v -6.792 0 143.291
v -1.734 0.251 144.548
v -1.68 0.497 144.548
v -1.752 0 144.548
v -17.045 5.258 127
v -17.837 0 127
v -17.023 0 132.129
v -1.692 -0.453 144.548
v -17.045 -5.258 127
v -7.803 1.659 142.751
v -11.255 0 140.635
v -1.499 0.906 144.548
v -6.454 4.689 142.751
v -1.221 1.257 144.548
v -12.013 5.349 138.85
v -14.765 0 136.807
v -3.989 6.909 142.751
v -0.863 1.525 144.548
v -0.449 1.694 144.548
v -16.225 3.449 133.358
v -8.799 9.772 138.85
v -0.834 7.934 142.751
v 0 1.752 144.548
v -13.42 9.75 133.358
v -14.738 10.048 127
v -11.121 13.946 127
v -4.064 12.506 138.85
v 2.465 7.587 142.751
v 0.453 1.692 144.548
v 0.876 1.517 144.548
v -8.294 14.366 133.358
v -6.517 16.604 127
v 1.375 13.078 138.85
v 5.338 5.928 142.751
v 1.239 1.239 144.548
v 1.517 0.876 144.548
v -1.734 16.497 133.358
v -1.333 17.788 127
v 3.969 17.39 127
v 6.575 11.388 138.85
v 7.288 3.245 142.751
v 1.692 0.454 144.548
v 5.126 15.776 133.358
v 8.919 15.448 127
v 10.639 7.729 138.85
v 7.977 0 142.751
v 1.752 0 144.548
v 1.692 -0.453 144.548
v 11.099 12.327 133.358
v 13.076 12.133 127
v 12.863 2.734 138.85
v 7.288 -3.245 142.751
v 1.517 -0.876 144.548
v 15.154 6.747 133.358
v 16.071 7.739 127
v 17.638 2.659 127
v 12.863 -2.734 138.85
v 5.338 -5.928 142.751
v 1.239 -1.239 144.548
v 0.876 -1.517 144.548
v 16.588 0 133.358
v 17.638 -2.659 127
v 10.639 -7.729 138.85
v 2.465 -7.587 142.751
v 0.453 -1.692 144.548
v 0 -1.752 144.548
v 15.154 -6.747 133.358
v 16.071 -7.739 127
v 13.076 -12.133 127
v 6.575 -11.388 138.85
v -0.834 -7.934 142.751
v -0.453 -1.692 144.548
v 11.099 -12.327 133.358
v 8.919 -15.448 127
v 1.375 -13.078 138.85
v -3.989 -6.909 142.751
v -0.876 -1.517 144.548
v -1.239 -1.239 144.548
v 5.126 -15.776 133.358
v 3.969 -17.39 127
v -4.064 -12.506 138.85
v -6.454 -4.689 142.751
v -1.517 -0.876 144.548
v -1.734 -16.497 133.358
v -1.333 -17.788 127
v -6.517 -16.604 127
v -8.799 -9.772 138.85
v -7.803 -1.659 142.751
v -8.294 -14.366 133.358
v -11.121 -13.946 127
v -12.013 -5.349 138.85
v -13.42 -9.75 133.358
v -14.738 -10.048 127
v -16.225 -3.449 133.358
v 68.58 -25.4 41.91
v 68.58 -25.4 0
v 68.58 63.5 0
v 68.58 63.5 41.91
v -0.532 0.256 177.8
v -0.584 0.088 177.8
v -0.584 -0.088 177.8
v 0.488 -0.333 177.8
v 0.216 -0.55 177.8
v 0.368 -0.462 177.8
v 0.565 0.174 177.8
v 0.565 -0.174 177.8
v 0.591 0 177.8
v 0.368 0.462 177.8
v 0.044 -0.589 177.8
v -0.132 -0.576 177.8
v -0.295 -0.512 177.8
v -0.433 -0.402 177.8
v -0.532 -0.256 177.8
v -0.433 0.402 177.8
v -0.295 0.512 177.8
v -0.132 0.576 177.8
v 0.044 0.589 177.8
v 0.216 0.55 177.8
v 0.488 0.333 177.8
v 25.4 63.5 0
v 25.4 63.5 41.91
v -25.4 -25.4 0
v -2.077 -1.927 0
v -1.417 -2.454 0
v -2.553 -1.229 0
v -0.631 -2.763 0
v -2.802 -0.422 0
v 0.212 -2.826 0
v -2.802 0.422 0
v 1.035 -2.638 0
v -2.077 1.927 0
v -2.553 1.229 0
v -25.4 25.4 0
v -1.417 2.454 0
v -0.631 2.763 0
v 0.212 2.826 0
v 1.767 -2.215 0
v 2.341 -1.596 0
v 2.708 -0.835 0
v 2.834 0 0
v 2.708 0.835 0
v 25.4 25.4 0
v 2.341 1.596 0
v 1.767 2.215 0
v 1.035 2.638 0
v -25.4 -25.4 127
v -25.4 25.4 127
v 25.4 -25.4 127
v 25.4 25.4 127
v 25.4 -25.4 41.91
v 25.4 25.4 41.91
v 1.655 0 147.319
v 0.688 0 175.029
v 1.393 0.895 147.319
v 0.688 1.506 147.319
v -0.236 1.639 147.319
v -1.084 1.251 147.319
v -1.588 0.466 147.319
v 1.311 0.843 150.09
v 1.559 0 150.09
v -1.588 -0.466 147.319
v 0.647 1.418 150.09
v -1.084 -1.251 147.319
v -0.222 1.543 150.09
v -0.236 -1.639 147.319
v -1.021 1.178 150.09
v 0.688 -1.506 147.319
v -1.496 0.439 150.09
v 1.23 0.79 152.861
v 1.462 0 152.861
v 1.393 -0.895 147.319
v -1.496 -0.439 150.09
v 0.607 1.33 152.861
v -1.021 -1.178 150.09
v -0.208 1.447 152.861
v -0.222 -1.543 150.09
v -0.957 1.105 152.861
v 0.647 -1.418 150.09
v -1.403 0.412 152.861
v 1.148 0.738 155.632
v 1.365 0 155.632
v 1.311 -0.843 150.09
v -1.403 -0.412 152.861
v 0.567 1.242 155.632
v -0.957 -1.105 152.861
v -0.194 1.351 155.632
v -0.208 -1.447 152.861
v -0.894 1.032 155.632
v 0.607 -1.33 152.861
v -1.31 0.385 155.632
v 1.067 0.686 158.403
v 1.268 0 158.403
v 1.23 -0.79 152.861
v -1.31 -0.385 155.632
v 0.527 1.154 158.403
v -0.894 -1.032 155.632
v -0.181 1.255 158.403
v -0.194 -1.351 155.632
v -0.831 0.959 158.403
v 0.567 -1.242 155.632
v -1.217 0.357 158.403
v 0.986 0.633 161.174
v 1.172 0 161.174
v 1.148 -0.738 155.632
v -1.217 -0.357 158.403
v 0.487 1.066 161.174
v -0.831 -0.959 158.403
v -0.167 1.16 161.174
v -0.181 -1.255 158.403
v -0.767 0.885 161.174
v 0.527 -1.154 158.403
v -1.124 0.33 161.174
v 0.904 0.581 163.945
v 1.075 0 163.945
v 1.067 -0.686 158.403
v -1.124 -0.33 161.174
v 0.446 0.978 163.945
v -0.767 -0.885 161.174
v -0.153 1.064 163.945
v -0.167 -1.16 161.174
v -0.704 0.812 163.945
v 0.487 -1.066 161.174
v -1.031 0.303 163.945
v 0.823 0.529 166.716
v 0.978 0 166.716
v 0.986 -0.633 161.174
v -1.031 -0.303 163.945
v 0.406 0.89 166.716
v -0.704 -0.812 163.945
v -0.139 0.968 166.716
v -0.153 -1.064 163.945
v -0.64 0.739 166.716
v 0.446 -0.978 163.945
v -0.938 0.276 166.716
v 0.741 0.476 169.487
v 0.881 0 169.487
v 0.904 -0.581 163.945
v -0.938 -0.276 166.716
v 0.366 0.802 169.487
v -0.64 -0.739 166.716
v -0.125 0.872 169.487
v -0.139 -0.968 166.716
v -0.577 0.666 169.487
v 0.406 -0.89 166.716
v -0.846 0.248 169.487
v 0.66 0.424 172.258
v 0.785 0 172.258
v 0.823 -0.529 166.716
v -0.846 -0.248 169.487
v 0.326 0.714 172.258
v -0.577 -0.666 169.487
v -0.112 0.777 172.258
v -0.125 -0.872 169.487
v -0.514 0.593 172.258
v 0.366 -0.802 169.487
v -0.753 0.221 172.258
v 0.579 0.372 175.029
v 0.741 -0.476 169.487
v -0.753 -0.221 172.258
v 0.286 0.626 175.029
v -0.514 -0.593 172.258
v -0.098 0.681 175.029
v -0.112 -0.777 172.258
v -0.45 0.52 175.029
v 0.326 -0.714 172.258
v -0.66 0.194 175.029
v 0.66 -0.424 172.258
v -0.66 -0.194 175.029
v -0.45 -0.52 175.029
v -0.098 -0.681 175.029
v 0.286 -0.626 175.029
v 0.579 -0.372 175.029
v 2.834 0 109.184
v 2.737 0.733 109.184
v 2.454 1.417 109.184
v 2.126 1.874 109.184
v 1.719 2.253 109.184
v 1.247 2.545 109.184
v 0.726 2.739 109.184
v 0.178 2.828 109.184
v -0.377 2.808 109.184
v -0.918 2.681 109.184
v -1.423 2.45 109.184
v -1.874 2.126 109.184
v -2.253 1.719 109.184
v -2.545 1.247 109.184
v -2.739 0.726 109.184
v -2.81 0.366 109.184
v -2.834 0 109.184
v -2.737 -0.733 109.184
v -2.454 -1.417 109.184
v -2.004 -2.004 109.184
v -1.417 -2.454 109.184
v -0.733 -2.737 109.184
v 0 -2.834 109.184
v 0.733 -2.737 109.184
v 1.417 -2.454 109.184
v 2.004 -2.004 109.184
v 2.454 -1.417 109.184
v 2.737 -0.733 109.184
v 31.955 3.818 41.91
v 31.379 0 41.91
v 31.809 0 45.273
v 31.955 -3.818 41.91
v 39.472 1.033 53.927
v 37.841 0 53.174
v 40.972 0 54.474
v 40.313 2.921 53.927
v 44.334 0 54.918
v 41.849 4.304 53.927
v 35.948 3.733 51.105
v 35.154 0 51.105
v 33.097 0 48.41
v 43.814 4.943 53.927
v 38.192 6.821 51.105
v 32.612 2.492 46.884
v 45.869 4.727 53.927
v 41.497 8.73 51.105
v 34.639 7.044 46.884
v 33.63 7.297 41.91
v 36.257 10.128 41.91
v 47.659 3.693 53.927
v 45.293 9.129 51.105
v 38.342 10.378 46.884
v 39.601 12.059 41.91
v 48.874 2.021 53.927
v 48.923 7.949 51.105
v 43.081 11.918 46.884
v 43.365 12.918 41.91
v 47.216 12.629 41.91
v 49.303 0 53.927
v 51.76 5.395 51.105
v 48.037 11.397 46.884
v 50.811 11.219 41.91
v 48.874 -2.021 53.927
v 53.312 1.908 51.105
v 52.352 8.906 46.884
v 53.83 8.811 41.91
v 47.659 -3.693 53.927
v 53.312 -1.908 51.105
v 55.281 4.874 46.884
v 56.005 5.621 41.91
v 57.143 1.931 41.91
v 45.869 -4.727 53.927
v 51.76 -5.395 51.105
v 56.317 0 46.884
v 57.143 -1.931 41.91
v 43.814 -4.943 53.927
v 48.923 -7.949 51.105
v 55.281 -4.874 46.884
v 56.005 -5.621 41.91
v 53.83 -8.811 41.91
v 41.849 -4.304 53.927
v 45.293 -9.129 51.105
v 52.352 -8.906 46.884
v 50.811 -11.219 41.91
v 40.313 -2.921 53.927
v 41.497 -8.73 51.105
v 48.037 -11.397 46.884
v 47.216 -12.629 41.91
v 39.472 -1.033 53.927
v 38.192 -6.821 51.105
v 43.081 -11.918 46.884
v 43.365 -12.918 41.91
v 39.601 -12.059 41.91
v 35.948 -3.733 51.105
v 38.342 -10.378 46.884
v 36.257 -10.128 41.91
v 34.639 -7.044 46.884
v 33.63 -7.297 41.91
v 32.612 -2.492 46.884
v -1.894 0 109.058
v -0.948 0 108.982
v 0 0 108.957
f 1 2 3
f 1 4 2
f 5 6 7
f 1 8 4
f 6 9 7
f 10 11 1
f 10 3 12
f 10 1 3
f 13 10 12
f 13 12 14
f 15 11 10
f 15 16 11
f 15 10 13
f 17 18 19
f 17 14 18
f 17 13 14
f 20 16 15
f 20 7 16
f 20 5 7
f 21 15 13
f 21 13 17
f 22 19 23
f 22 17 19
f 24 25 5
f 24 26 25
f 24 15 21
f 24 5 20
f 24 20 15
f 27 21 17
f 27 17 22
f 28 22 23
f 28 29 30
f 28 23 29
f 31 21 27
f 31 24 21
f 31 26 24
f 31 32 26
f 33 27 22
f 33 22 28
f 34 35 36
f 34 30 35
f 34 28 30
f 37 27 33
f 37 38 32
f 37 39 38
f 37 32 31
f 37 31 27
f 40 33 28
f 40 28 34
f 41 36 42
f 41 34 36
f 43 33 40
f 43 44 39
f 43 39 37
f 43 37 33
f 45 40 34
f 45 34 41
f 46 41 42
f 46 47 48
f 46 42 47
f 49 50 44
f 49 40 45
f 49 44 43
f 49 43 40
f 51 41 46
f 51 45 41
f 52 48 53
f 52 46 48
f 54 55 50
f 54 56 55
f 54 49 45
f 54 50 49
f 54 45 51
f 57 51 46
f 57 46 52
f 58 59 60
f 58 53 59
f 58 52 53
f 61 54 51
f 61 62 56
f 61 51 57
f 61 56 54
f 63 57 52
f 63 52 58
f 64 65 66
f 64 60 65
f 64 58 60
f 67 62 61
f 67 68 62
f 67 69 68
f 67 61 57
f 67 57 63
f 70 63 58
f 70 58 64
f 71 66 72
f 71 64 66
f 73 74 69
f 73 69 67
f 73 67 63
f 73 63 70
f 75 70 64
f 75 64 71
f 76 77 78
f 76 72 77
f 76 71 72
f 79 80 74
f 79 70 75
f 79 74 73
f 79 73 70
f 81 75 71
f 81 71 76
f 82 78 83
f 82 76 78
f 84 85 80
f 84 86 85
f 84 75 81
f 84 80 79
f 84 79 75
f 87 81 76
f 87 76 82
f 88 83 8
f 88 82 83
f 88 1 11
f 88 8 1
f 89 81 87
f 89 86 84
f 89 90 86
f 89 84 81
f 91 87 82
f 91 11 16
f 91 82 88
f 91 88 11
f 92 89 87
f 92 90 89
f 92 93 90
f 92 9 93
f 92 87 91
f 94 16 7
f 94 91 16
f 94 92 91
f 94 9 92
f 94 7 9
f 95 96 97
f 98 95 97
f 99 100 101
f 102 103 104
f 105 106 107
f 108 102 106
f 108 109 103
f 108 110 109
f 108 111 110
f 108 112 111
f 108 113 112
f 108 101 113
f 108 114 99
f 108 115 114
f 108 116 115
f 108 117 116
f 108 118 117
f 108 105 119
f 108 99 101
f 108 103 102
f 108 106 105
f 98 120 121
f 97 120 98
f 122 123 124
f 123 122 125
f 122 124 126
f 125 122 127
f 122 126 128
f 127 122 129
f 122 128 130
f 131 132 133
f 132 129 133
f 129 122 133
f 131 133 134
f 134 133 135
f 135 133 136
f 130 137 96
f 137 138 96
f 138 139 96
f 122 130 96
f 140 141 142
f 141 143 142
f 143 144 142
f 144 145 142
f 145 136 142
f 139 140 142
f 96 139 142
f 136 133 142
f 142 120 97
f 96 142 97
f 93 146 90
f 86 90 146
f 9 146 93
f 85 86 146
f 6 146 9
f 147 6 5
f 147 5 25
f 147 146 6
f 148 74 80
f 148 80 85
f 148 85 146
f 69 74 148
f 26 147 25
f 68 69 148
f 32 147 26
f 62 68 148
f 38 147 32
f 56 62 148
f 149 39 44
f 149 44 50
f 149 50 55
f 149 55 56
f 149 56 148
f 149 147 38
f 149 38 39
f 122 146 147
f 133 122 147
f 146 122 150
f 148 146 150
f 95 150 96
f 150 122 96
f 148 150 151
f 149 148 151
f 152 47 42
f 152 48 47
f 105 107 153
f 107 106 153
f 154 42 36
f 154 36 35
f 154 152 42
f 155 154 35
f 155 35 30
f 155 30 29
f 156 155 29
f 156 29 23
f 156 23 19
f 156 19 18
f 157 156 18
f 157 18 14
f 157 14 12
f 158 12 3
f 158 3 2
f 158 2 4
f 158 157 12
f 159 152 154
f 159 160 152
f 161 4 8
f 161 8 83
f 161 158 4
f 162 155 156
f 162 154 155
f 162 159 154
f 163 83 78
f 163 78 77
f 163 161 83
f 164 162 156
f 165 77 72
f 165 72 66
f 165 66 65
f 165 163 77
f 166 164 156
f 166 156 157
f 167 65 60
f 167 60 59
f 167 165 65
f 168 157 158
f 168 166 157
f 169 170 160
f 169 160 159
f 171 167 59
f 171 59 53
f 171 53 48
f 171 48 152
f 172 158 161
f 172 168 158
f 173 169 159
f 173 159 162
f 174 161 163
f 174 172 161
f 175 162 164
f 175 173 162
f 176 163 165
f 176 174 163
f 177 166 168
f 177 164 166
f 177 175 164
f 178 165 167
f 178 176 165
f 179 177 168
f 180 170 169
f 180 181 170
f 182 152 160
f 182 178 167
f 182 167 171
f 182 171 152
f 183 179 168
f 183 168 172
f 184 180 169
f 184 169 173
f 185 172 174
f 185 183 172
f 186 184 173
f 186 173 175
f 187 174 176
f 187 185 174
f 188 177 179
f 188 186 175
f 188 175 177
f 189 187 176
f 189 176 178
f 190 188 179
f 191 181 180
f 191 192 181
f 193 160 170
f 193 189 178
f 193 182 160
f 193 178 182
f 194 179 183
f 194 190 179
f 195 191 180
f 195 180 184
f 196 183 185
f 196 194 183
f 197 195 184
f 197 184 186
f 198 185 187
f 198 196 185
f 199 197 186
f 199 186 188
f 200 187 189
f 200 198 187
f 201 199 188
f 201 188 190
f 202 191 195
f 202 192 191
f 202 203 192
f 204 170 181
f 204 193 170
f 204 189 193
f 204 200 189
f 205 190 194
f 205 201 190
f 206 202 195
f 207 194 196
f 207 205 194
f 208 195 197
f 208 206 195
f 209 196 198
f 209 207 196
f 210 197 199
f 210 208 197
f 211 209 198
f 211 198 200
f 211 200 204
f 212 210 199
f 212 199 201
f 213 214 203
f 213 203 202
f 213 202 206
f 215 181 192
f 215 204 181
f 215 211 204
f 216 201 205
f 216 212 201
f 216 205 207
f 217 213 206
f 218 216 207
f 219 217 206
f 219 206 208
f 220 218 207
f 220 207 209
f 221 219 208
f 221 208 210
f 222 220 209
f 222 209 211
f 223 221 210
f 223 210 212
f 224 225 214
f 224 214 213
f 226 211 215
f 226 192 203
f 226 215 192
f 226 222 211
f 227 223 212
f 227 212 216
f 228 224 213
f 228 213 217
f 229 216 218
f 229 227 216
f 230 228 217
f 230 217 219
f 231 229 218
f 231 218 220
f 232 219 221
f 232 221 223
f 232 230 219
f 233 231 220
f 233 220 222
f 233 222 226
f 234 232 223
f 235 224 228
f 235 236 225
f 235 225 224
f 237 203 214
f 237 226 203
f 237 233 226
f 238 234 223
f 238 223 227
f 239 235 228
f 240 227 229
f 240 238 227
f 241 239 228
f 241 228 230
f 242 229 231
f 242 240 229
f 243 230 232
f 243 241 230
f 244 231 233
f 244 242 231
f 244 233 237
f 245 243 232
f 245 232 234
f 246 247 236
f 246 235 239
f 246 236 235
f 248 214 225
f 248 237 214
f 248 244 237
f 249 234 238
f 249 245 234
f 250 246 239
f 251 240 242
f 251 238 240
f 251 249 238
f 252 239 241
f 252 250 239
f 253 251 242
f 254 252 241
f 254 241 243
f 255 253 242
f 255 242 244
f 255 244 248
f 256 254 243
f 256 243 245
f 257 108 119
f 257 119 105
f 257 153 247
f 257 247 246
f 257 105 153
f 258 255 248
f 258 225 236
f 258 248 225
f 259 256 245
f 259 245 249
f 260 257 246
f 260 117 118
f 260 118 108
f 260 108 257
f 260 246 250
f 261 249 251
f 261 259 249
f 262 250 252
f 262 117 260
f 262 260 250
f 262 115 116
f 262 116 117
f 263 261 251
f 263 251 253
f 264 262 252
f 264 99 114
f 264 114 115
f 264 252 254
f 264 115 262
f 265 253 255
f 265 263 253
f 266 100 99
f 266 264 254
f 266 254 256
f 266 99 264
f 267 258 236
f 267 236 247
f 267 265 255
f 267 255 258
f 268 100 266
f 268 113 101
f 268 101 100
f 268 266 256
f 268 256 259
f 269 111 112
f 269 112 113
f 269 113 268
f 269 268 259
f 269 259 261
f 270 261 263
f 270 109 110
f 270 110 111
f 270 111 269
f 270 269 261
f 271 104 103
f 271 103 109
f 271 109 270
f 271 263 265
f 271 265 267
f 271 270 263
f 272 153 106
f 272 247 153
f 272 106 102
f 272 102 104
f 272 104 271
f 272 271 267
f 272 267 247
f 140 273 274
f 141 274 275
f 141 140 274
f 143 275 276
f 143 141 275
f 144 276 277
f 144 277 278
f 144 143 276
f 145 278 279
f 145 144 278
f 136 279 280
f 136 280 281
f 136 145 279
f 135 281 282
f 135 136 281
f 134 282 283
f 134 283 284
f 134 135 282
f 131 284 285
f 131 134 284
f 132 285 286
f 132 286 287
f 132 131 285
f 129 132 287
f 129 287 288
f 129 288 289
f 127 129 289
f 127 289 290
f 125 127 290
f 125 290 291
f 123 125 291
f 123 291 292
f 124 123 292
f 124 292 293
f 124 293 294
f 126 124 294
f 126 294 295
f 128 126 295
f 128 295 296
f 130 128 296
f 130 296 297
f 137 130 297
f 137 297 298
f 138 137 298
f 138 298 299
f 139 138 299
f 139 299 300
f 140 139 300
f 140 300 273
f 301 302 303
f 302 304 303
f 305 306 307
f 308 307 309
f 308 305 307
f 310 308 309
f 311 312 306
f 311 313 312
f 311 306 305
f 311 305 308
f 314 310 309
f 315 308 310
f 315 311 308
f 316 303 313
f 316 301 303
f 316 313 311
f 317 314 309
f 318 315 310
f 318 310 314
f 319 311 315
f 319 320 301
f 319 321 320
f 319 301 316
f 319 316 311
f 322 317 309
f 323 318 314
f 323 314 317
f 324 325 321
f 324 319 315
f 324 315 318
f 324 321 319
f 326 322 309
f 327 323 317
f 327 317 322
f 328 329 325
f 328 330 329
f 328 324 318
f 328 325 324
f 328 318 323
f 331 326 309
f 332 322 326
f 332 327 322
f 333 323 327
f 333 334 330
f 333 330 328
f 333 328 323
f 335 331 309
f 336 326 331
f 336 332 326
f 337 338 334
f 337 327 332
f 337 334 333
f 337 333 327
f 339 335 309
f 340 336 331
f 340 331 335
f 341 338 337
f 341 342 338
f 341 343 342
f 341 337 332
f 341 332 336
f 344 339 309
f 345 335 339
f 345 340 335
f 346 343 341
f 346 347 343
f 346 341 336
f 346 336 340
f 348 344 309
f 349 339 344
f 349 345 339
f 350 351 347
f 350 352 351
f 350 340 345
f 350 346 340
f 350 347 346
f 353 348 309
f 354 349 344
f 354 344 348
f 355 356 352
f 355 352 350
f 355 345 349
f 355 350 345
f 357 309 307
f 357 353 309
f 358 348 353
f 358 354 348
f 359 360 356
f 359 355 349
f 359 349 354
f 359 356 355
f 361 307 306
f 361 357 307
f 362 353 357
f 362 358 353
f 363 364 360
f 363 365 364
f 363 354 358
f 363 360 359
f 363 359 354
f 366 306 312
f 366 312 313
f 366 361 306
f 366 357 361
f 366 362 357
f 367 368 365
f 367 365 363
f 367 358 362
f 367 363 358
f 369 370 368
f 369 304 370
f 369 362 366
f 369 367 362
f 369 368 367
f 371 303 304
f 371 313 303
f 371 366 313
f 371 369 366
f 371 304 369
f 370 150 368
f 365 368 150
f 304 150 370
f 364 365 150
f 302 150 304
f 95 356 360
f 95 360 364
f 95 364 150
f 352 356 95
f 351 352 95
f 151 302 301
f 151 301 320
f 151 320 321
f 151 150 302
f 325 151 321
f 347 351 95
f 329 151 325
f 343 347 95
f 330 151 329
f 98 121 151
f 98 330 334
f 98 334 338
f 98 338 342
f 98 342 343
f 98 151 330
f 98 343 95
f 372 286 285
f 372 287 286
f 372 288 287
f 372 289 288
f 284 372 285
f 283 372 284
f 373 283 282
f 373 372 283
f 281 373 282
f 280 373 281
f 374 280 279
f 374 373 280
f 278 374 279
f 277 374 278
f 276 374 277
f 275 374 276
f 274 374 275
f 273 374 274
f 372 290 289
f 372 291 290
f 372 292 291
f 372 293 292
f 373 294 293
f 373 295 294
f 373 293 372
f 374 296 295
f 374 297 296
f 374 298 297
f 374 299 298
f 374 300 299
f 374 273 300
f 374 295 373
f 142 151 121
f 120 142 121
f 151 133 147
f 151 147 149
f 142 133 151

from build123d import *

# Parameters (mm, degrees)
F0_W     = 50.8
F0_H     = 50.8
F0_R     = 2.8336716143
F1_DEPTH = 127
F4_R     = 2.3649720561
F5_DEPTH = 50.8
F5_TAPER = 2
F0_W_2   = 43.18
F0_H_2   = 38.1
F6_DEPTH = 41.91


with BuildPart() as f1:
    # F0 (on Top) → F1 (new body)
    with BuildSketch(Plane.XY):
        Rectangle(F0_W, F0_H)
        Circle(F0_R, mode=Mode.SUBTRACT)
    extrude(amount=F1_DEPTH)

    # F2 (on Front) → F3 (revolve)
    with BuildSketch(Plane.XZ):
        with BuildLine():
            Line((0, 108.9572302283), (0, 144.6343966542))
            ThreePointArc((0, 144.6343966542), (-17.8385832129, 126.7958134413), (0, 108.9572302283))
        make_face()
    revolve(axis=Axis((0, 0, 74.6575031662), (0, 0, -1)))

    # F4 (on face) → F5 (join)
    with BuildSketch(Plane.XY.offset(127)):
        Circle(F4_R)
    extrude(amount=F5_DEPTH, taper=F5_TAPER)

    # F0 (on Top) → F6 (join)
    with BuildSketch(Plane.XY):
        Rectangle(F0_W, F0_H)
        Circle(F0_R, mode=Mode.SUBTRACT)
        with Locations((46.99, 0)):
            Rectangle(F0_W_2, F0_H)
        with Locations((46.99, 44.45)):
            Rectangle(F0_W_2, F0_H_2)
    extrude(amount=F6_DEPTH)

    # F7 (on Front) → F8 (revolve)
    with BuildSketch(Plane.XZ):
        with BuildLine():
            Line((44.333525002, 29.0094343104), (44.333525002, 54.918085309))
            ThreePointArc((44.333525002, 54.918085309), (31.3791995027, 41.9637598097), (44.333525002, 29.0094343104))
        make_face()
    revolve(axis=Axis((44.333525002, 0, 30.4748073686), (0, 0, -1)))


solid = f1.part
